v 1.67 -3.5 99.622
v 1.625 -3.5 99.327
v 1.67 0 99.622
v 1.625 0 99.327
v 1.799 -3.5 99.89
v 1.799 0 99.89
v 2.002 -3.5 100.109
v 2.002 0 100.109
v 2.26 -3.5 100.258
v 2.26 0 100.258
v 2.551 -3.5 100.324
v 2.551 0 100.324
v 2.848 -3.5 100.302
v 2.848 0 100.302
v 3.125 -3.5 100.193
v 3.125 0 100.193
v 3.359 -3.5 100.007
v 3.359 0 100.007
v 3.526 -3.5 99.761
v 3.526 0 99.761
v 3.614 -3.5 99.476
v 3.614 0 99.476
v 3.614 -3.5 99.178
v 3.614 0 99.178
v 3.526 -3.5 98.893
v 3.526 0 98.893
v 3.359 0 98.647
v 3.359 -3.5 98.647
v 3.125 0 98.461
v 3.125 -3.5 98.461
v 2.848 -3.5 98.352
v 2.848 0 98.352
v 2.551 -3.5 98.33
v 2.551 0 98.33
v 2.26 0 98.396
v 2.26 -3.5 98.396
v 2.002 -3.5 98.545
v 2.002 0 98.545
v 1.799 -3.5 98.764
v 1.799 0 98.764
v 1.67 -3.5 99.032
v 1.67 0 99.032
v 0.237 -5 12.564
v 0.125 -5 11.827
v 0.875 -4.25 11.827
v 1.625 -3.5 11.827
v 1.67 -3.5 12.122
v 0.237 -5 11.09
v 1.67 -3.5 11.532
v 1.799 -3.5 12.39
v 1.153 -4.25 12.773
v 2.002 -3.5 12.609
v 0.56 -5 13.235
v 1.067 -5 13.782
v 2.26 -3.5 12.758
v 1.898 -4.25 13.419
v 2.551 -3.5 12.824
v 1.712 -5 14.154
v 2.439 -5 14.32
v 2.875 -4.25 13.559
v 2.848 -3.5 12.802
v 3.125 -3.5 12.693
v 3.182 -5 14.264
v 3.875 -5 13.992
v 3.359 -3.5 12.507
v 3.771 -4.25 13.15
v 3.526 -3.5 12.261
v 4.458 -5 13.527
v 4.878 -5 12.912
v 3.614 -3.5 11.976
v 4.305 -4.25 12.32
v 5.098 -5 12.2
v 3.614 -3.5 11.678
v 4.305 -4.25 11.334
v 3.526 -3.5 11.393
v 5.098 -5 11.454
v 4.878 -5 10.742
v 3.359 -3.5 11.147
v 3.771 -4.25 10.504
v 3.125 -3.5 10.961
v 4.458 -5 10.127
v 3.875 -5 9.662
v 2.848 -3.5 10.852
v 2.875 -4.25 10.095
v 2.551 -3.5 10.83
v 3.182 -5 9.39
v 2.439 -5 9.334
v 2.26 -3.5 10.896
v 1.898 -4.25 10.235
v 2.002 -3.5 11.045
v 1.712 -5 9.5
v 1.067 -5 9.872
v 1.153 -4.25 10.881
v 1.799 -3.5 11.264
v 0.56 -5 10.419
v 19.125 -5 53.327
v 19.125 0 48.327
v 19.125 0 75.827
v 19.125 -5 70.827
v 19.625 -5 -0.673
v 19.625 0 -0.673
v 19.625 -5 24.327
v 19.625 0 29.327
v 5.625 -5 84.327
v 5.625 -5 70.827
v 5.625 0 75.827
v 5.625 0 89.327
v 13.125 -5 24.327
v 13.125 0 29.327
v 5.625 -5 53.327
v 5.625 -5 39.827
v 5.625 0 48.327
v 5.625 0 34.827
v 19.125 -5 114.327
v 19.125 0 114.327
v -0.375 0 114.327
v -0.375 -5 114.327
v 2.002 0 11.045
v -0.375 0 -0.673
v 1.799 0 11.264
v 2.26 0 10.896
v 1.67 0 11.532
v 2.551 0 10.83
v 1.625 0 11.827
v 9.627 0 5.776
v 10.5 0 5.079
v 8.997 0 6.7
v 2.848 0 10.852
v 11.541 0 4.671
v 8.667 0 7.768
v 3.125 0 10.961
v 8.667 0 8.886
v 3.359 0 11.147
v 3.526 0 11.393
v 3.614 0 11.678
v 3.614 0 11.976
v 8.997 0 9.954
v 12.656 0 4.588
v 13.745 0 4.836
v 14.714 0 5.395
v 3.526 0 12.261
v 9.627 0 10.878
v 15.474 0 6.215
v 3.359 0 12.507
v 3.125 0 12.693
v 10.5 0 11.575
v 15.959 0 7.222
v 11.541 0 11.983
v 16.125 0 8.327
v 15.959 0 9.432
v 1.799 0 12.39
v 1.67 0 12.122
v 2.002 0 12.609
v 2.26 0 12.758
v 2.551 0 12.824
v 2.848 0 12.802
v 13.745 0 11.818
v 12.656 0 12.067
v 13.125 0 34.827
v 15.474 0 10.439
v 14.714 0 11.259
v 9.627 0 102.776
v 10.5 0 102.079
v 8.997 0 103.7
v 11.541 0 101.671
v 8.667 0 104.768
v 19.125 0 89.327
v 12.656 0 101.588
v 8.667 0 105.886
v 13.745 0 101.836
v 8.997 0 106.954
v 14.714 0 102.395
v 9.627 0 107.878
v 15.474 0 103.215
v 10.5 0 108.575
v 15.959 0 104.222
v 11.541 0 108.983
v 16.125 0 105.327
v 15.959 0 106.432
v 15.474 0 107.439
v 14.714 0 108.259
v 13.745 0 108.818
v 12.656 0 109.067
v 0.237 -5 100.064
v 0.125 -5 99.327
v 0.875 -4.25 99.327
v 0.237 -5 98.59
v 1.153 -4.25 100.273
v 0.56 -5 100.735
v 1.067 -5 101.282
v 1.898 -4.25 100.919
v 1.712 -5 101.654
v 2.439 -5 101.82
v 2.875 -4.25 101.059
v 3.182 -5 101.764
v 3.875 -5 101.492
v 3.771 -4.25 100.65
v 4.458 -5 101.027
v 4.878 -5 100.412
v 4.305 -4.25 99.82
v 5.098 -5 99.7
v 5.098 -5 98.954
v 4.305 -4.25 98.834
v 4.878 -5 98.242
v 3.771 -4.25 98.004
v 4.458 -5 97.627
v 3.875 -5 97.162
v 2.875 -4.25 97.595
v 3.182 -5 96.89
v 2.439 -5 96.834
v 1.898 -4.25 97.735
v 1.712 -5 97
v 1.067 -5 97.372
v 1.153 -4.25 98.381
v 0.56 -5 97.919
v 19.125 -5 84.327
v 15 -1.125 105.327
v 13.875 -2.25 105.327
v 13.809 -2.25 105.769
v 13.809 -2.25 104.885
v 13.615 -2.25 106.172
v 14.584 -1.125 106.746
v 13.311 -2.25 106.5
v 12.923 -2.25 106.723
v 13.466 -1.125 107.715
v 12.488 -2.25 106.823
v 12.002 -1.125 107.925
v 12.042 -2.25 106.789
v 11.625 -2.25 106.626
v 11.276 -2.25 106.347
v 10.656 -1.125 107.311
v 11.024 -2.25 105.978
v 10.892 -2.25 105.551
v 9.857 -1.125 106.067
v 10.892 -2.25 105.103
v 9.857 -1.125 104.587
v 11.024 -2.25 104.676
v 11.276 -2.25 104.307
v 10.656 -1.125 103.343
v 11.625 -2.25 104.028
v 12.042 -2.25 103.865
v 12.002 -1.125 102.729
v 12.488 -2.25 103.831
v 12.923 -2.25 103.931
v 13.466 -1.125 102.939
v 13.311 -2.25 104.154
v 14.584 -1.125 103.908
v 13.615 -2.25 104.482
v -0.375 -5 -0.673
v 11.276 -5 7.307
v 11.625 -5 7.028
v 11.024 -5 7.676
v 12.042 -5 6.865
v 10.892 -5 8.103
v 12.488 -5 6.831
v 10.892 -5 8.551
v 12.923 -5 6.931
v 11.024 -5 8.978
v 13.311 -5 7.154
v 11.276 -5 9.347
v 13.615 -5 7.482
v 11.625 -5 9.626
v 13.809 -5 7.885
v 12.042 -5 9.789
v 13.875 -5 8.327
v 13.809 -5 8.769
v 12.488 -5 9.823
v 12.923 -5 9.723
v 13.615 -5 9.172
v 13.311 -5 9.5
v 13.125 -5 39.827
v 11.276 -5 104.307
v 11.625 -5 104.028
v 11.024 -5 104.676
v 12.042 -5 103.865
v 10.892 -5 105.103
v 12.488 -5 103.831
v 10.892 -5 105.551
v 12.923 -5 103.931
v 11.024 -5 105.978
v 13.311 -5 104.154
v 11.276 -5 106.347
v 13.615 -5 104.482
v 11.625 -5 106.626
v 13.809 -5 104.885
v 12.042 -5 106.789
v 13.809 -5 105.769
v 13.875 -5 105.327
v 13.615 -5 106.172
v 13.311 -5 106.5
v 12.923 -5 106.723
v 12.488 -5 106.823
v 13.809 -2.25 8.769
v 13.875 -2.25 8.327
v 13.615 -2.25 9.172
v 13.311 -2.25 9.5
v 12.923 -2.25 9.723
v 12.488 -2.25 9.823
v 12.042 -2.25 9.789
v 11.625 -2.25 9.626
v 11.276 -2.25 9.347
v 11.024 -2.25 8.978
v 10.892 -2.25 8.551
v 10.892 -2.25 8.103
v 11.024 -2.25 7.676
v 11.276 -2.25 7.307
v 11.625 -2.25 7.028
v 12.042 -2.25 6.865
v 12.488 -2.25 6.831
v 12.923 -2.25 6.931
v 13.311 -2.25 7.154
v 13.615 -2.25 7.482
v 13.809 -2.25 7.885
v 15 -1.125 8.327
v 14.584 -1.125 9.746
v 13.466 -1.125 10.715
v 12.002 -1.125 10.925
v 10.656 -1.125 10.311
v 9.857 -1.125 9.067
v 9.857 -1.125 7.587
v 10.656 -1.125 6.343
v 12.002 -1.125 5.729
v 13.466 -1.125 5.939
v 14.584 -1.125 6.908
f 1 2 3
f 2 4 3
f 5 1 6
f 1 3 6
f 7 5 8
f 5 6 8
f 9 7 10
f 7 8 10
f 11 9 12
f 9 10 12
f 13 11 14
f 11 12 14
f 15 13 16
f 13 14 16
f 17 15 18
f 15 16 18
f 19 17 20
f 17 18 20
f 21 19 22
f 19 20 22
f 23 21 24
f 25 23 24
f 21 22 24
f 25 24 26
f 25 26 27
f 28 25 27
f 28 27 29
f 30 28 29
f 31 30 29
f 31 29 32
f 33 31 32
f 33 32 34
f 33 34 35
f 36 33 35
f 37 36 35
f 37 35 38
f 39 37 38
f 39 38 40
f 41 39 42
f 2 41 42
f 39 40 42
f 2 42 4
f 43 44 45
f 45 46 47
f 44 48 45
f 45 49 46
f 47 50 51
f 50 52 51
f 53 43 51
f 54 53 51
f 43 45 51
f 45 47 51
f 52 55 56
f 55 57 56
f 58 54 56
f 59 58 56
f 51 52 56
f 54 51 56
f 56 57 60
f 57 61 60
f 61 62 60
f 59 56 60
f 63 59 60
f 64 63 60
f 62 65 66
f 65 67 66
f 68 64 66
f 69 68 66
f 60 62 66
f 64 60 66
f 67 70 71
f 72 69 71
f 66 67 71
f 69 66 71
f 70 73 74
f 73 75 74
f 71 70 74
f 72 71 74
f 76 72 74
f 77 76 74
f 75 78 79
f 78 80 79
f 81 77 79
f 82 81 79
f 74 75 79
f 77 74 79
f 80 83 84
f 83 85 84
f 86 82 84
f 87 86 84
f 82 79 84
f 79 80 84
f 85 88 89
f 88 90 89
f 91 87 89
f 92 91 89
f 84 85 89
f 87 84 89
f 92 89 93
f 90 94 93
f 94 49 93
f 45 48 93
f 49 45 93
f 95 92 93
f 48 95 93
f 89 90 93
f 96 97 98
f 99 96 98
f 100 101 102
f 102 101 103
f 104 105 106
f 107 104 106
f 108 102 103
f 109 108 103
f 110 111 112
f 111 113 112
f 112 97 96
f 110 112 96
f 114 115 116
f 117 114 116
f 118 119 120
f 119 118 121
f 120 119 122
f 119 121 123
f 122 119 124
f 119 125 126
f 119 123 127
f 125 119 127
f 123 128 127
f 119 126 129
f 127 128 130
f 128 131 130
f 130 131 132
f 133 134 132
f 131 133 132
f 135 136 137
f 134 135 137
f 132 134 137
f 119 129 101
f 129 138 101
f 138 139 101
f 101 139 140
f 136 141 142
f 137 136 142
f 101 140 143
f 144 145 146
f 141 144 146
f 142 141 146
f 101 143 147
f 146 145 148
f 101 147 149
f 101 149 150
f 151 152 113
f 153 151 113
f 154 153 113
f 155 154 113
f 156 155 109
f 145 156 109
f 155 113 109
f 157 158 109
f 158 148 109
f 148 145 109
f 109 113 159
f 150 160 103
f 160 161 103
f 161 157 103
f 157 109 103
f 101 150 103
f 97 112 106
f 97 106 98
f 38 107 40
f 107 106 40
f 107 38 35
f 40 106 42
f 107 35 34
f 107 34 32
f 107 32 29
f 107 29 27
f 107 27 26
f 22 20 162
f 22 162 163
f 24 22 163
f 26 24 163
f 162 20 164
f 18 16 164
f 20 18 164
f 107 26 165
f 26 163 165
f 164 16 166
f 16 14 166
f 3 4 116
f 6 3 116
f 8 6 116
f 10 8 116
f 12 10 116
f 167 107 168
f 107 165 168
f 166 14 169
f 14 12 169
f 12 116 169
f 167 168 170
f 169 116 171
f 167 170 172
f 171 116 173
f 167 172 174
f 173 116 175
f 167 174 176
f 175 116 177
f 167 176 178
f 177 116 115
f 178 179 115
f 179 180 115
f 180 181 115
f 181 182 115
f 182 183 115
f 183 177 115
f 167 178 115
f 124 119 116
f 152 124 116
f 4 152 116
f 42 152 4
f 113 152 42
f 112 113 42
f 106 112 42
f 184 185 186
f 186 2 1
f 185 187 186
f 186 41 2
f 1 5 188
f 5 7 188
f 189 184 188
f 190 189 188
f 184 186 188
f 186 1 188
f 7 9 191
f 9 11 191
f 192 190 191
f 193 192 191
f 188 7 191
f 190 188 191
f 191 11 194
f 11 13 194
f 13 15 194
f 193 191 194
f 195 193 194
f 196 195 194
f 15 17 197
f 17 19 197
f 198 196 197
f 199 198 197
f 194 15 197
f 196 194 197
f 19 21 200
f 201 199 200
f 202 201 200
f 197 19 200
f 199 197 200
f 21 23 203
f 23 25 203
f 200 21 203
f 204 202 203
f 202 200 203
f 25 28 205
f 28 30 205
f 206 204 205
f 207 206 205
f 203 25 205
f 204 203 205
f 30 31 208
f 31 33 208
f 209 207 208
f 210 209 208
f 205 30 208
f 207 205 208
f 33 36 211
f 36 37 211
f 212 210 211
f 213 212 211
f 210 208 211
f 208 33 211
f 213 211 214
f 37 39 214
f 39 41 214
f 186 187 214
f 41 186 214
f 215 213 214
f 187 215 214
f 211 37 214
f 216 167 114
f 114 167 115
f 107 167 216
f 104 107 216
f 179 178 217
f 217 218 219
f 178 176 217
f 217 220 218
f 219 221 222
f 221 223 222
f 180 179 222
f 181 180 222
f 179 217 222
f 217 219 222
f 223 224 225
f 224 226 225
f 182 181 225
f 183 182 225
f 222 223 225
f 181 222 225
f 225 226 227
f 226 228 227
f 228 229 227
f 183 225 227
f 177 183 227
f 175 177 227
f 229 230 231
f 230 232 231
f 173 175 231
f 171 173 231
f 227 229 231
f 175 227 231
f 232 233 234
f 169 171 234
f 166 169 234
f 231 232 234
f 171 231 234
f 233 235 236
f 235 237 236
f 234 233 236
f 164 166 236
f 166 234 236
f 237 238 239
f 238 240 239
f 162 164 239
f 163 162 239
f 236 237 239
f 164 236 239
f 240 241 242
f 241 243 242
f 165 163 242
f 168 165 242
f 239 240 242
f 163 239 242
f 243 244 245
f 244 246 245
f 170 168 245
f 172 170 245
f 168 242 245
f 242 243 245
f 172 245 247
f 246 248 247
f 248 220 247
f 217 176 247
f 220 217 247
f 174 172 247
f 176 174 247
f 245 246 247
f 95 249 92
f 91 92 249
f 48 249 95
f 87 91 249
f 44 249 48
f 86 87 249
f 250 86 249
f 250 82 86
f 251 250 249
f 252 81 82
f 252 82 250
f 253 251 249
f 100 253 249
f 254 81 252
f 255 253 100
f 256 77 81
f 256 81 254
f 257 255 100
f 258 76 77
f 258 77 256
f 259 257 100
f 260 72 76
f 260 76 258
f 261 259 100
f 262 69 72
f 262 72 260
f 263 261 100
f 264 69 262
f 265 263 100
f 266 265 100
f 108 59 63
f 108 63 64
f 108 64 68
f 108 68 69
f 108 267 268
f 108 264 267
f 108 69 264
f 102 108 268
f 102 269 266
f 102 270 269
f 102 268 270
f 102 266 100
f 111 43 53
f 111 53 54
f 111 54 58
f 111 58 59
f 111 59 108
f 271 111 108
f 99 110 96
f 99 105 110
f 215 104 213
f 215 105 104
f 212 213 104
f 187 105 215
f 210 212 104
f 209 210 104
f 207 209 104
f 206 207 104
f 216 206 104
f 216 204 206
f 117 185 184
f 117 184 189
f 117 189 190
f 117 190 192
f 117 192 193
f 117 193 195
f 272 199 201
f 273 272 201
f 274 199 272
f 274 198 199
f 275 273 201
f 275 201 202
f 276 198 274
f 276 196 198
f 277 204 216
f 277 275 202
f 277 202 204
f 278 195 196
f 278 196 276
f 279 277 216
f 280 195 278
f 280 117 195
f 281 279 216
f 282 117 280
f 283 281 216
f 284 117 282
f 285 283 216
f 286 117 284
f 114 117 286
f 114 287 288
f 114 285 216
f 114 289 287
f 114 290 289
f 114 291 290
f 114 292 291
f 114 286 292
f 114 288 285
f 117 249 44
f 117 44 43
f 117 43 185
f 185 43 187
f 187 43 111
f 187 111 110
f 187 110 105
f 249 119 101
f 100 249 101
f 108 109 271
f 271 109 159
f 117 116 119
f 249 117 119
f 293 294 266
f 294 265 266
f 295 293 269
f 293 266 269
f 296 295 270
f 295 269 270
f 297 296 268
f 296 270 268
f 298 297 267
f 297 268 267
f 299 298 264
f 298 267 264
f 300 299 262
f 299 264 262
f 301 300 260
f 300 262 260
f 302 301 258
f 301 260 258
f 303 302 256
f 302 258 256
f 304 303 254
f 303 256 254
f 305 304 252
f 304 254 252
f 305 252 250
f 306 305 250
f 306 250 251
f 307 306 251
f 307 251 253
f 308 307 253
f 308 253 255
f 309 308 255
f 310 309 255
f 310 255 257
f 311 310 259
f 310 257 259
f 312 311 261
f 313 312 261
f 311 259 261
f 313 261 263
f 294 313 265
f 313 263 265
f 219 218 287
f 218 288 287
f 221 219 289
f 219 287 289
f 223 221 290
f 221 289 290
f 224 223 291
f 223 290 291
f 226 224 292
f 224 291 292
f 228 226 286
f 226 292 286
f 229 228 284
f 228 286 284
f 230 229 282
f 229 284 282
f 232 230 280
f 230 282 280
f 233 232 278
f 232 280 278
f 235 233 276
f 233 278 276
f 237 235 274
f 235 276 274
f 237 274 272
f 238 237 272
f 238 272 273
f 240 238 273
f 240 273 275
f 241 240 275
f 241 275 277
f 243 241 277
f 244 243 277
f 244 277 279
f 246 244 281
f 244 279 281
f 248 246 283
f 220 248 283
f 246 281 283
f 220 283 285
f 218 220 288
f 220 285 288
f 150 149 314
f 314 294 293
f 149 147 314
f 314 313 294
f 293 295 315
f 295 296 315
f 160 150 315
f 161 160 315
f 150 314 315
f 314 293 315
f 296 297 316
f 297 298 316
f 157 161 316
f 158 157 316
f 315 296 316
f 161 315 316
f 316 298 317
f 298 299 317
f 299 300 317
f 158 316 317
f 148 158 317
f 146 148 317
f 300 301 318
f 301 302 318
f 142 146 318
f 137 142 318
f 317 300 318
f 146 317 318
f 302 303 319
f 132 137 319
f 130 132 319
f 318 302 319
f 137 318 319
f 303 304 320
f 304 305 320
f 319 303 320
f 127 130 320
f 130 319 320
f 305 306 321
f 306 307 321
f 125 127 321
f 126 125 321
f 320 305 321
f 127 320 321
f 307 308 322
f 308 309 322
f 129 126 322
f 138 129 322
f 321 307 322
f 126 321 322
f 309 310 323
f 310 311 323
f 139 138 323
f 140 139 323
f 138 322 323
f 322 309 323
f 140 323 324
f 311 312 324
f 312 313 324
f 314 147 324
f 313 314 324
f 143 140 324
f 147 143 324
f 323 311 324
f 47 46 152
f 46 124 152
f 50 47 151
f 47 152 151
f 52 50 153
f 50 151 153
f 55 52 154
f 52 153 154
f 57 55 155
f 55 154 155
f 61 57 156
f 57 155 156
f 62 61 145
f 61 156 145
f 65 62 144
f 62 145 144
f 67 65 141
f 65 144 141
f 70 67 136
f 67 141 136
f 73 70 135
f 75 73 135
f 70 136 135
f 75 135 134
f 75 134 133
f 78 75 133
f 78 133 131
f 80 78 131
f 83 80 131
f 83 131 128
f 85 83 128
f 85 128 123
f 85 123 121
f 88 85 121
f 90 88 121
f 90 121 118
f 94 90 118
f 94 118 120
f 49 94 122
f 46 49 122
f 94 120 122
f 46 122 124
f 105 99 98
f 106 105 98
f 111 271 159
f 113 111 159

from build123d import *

# Parameters (mm, degrees)
F1_DEPTH        = 5
F4_DEPTH        = 13.5
F6_DEPTH        = 7.5
F8_DEPTH        = 6.5
F10_D           = 3
F10_CSINK_D     = 7.5
F10_CSINK_ANGLE = 90
F12_D           = 2
F12_CSINK_D     = 5
F12_CSINK_ANGLE = 90


with BuildPart() as f1:
    # F0 (on Front) → F1 (new body)
    with BuildSketch(Plane.XZ):
        Polygon((19.12546, 114.327021), (-0.37454, 114.327021), (-0.37454, -0.672979), (19.62546, -0.672979), (19.62546, 29.327021), (13.12546, 29.327021), (13.12546, 39.827021), (5.62546, 39.827021), (5.62546, 48.327021), (19.12546, 48.327021), (19.12546, 75.827021), (5.62546, 75.827021), (5.62546, 84.327021), (19.12546, 84.327021), align=None)
    extrude(amount=F1_DEPTH)

    # F2 (on face) + F3 (on face) → F4 (cut)
    with BuildSketch(Plane.YZ.offset(19.12546)):
        Polygon((0, 89.327021), (-5, 84.327021), (0, 84.327021), align=None)
    with BuildSketch(Plane.YZ.offset(19.12546)):
        Polygon((-5, 70.827021), (0, 75.827021), (-5, 75.827021), align=None)
        Polygon((-5, 48.327021), (0, 48.327021), (-5, 53.327021), align=None)
    extrude(amount=-F4_DEPTH, mode=Mode.SUBTRACT)

    # F5 (on face) → F6 (cut)
    with BuildSketch(Plane.YZ.offset(13.12546)):
        Polygon((0, 39.827021), (-5, 39.827021), (0, 34.827021), align=None)
    extrude(amount=-F6_DEPTH, mode=Mode.SUBTRACT)

    # F7 (on face) → F8 (cut)
    with BuildSketch(Plane.YZ.offset(19.62546)):
        Polygon((-5, 24.327021), (0, 29.327021), (-5, 29.327021), align=None)
    extrude(amount=-F8_DEPTH, mode=Mode.SUBTRACT)

    # F10 (through all)
    with Locations(Plane(origin=(0, 0, 0), x_dir=(-1, 0, 0), z_dir=(0, 1, 0))):
        with Locations((-12.37546, 105.327021), (-12.37546, 8.327021)):
            CounterSinkHole(F10_D / 2, F10_CSINK_D / 2, counter_sink_angle=F10_CSINK_ANGLE)

    # F12 (through all)
    with Locations(Plane.XZ.offset(5)):
        with Locations((2.62546, 11.827021), (2.62546, 99.327021)):
            CounterSinkHole(F12_D / 2, F12_CSINK_D / 2, counter_sink_angle=F12_CSINK_ANGLE)


solid = f1.part
